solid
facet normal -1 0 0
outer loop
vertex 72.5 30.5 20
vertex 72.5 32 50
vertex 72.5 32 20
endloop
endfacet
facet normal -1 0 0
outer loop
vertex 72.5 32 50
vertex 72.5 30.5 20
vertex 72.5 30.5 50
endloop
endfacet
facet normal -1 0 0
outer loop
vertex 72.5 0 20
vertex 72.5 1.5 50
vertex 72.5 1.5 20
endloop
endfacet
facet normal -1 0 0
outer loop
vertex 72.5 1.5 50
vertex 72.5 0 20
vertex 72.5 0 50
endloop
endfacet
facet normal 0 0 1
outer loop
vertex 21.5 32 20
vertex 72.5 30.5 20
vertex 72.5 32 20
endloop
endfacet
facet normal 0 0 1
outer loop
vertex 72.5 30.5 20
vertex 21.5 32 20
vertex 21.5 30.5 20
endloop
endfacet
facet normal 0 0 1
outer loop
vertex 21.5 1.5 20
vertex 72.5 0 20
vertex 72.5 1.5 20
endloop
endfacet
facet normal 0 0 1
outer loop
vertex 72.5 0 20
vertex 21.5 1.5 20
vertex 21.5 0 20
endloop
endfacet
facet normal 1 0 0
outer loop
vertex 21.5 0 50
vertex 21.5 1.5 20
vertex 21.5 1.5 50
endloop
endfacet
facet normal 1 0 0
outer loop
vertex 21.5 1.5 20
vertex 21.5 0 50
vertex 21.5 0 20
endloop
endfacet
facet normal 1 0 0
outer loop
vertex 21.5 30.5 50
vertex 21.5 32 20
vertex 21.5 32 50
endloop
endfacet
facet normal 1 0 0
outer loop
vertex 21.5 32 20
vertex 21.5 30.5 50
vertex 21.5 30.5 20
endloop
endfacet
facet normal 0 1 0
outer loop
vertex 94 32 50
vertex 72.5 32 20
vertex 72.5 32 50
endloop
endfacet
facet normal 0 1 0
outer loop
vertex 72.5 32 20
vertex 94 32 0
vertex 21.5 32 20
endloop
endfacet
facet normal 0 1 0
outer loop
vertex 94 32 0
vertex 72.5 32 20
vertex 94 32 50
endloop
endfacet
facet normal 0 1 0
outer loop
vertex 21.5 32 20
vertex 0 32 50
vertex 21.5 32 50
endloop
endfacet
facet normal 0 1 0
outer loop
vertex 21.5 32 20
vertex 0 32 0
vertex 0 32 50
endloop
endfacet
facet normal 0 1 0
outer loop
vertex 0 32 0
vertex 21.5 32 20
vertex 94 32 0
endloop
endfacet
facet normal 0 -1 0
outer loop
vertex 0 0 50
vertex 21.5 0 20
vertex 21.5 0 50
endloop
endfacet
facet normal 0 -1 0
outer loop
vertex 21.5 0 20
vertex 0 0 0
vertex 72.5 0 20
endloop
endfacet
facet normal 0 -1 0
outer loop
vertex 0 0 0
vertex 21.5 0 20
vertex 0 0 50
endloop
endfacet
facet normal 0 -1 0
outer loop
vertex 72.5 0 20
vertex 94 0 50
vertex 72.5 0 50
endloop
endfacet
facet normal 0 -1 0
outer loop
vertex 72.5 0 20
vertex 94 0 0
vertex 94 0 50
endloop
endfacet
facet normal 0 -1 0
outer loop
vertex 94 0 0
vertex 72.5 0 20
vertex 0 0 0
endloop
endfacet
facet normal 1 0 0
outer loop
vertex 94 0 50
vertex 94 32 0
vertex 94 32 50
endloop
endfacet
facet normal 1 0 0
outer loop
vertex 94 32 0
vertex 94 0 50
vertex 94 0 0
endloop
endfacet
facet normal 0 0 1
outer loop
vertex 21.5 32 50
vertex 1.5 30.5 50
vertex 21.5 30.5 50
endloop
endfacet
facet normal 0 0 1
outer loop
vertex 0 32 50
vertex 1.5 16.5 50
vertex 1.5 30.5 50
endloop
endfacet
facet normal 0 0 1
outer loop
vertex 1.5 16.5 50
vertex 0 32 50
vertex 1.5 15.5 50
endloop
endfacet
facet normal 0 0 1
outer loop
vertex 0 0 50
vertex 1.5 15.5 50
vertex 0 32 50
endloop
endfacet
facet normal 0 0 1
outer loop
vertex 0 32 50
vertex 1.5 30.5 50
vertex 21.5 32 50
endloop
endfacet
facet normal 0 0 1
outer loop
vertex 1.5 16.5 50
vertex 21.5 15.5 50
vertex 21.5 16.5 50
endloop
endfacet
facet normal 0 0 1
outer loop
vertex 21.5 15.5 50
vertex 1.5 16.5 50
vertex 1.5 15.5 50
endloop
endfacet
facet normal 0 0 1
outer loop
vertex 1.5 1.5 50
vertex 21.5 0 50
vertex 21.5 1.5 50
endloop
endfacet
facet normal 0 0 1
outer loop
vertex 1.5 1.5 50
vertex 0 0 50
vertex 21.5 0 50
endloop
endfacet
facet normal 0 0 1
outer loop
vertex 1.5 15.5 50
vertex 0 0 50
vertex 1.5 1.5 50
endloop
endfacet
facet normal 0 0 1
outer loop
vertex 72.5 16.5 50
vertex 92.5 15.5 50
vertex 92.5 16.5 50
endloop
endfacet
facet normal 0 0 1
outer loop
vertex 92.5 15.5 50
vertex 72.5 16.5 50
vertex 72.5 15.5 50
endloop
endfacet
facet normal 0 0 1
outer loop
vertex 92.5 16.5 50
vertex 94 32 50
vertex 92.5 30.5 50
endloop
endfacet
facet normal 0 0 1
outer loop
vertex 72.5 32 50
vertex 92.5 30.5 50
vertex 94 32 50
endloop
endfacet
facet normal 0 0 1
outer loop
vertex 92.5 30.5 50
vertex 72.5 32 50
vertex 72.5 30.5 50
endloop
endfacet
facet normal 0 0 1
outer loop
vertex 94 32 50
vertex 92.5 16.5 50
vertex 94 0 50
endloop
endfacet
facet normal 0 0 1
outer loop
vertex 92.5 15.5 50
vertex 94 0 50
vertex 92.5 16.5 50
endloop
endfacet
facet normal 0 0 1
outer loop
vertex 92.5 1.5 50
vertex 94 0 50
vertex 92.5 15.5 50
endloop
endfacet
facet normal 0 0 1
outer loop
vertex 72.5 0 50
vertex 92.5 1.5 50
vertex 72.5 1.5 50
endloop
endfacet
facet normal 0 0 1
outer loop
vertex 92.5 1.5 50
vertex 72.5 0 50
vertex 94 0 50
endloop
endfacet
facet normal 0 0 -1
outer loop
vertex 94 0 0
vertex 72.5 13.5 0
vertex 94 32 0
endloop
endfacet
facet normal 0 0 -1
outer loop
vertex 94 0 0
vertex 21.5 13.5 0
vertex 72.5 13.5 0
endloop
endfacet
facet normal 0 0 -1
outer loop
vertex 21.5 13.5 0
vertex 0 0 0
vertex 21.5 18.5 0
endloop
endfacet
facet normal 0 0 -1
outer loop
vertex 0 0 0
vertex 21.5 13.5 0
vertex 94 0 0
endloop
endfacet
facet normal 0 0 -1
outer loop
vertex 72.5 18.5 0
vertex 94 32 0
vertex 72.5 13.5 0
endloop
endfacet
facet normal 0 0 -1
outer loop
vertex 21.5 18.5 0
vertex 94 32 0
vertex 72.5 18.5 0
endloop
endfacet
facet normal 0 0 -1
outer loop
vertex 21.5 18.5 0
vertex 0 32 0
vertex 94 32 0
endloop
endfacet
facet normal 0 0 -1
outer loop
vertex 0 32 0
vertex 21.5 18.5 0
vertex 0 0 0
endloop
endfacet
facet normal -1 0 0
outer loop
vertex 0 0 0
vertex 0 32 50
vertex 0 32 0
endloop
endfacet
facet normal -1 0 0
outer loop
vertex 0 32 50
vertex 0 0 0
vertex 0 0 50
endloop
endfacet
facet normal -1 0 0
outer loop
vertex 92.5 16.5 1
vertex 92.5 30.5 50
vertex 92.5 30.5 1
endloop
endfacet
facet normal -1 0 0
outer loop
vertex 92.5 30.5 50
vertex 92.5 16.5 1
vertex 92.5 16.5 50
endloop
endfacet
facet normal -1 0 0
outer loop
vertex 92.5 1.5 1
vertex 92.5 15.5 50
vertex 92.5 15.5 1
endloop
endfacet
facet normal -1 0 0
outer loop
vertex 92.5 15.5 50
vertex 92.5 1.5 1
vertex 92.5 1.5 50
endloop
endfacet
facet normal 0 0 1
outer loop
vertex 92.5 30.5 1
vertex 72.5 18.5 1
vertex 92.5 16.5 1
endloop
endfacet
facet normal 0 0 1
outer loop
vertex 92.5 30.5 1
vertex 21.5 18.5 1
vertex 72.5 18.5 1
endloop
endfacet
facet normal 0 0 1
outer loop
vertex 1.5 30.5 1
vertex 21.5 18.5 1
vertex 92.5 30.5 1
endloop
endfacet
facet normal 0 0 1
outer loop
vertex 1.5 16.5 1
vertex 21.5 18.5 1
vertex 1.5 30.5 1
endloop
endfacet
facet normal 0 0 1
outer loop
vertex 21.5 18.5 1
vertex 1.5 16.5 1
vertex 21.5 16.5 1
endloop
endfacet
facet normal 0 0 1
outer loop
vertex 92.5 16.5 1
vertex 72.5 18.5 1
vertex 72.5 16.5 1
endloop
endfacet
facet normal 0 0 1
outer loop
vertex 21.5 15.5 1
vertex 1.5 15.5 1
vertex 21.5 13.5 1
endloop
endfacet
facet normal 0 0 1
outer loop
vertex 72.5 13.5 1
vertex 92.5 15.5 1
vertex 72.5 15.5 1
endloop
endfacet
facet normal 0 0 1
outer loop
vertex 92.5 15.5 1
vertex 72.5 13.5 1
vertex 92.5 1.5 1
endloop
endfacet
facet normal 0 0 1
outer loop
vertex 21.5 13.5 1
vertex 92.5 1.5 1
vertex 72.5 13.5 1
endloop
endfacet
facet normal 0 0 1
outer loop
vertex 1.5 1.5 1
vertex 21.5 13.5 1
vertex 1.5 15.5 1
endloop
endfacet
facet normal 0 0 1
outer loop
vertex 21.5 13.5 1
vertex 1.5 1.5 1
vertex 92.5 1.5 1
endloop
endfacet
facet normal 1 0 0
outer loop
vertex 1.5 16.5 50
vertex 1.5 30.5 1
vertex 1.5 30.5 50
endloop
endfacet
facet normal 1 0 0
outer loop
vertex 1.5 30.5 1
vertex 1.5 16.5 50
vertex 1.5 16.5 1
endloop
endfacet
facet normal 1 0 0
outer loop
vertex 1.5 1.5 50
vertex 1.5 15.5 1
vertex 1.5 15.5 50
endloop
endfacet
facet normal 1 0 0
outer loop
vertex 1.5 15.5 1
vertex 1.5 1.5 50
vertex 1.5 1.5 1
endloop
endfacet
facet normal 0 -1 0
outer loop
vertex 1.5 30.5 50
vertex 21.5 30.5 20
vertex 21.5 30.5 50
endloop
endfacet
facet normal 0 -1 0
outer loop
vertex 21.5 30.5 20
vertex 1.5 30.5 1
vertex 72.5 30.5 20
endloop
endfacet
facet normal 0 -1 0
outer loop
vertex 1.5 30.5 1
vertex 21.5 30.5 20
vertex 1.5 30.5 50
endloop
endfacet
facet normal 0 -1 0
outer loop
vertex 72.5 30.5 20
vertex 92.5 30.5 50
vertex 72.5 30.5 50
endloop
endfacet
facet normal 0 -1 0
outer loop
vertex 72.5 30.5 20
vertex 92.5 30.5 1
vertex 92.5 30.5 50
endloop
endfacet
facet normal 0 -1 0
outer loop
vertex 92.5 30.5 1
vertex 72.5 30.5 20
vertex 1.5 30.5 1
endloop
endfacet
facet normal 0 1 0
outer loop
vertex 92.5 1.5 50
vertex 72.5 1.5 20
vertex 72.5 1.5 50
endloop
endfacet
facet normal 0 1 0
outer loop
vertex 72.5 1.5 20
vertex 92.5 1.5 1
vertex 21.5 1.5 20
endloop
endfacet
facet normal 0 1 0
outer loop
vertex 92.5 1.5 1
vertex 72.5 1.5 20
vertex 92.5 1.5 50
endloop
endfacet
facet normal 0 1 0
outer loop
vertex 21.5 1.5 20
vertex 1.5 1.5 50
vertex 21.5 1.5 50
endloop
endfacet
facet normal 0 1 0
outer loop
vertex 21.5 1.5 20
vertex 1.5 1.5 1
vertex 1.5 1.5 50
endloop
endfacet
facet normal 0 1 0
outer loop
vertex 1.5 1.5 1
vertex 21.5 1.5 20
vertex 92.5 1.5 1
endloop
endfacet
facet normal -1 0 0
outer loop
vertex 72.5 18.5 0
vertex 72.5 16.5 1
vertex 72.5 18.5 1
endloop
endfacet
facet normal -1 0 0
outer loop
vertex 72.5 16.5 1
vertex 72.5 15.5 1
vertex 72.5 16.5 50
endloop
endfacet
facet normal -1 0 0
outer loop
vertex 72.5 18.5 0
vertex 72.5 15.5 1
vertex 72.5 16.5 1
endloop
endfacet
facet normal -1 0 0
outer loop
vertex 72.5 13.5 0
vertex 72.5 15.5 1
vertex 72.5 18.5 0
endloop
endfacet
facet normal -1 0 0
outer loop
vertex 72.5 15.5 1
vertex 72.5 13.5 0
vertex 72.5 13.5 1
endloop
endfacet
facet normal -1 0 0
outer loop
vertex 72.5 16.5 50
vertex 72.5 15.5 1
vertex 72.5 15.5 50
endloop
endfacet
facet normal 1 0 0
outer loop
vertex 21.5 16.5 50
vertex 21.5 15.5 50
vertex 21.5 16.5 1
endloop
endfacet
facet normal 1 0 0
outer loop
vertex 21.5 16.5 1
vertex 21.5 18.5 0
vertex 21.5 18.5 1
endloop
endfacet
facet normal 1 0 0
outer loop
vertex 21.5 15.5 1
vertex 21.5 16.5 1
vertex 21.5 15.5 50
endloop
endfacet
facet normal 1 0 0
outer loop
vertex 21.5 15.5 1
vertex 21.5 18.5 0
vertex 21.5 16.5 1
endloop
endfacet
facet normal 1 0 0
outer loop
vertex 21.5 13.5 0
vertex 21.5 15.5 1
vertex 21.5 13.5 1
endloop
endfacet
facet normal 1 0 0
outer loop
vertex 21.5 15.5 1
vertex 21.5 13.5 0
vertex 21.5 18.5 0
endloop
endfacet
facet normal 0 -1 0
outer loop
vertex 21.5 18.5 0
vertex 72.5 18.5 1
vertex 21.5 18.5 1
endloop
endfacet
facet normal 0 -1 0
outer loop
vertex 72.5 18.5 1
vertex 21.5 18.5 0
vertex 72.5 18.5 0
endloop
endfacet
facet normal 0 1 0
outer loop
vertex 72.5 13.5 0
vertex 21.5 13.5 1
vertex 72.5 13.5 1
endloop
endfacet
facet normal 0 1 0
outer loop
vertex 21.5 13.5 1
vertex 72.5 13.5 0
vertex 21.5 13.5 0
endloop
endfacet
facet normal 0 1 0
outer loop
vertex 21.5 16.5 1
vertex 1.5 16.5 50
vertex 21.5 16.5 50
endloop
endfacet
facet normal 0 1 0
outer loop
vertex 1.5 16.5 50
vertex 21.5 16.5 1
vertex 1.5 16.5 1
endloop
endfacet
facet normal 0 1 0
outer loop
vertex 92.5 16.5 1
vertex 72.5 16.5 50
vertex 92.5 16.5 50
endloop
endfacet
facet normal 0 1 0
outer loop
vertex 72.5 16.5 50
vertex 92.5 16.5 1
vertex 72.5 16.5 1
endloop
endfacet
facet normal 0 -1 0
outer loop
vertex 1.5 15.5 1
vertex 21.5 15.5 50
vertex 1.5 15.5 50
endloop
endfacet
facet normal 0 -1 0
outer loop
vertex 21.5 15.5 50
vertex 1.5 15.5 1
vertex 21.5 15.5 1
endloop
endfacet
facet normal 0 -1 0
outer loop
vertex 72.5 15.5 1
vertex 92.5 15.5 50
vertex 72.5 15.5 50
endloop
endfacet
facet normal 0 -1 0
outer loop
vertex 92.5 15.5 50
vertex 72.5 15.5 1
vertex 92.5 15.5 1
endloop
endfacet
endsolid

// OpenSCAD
// file: ../../../standard-organizers/container.scad
function defaultBottomThickness() = 1;
function defaultBottomClearance() = 16;
function defaultMinWallThickness() = 1;
function defaultWallClearance() = 16;
function defaultSideMultiple() = 2;

function getOuterWidth(innerWidth, minWallThickness, sideMultiple) = ceil((innerWidth + 2*minWallThickness)/sideMultiple)*sideMultiple;
function getOuterDepth(innerDepth, minWallThickness, sideMultiple) = ceil((innerDepth + 2*minWallThickness)/sideMultiple)*sideMultiple;
function getSideWallThickness(innerWidth, minWallThickness, sideMultiple) = (getOuterWidth(innerWidth, minWallThickness, sideMultiple) - innerWidth)/2;
function getFrontWallThickness(innerDepth, minWallThickness, sideMultiple) = (getOuterDepth(innerDepth, minWallThickness, sideMultiple) - innerDepth)/2;

function getFrontHole(innerWidth, innerDepth, outerHeight, bottomClearance, minWallThickness, frontWallClearance, sideMultiple) = [
    [
        getSideWallThickness(innerWidth, minWallThickness, sideMultiple) + frontWallClearance,
        0,
        bottomClearance
    ],
    [
        max(5, innerWidth - 2*frontWallClearance),
        getOuterDepth(innerDepth, minWallThickness, sideMultiple),
        outerHeight
    ]
];

function getSideHole(innerWidth, innerDepth, outerHeight, bottomClearance, minWallThickness, sideWallClearance, sideMultiple) = [
    [
        0,
        getFrontWallThickness(innerDepth, minWallThickness, sideMultiple) + sideWallClearance,
        bottomClearance
    ],
    [
        getOuterWidth(innerWidth, minWallThickness, sideMultiple),
        max(5, innerDepth - 2*sideWallClearance),
        outerHeight
    ]
];

module container (
    innerWidth,
    innerDepth,
    outerHeight,
    type = "solid",
    bottomThickness = defaultBottomThickness(),
    bottomClearance = defaultBottomClearance(),
    minWallThickness = defaultMinWallThickness(),
    frontWallClearance = defaultWallClearance(),
    sideWallClearance = defaultWallClearance(),
    sideMultiple = defaultSideMultiple()
) {
    innerHeight = outerHeight - bottomThickness;
    
    outerWidth = getOuterWidth(innerWidth, minWallThickness, sideMultiple);
    outerDepth = getOuterDepth(innerDepth, minWallThickness, sideMultiple);
    sideWallThickness = getSideWallThickness(innerWidth, minWallThickness, sideMultiple);
    frontWallThickness = getFrontWallThickness(innerDepth, minWallThickness, sideMultiple);

    echo("Width", innerWidth, outerWidth, sideWallThickness);
    echo("Depth", innerDepth, outerDepth, frontWallThickness);

    holeWidth = max(5, innerWidth - 2*bottomClearance);
    holeDepth = max(5, innerDepth - 2*bottomClearance);
    holeX = sideWallThickness + innerWidth/2 - holeWidth/2;
    holeY = frontWallThickness + innerDepth/2 - holeDepth/2;
    
    frontHole = getFrontHole(
        innerWidth,
        innerDepth,
        outerHeight,
        bottomClearance,
        minWallThickness,
        frontWallClearance,
        sideMultiple
    );
    frontHolePosition = frontHole[0];
    frontHoleDimesions = frontHole[1];
    
    sideHole = getSideHole(
        innerWidth,
        innerDepth,
        outerHeight,
        bottomClearance,
        minWallThickness,
        sideWallClearance,
        sideMultiple
    );
    sideHolePosition = sideHole[0];
    sideHoleDimensions = sideHole[1];

    difference() {
        // Outer box
        cube([outerWidth, outerDepth, outerHeight]);
        
        // Inner box
        translate([sideWallThickness, frontWallThickness, bottomThickness])
        cube([innerWidth, innerDepth, innerHeight]);
        
        // Bottom hole
        translate([holeX, holeY, 0])
        cube([holeWidth, holeDepth, bottomThickness]);
        
        if(type == "hollow") {
            // Front and back hole
            translate(frontHolePosition)
            cube(frontHoleDimesions);
            
            // Side holes
            translate(sideHolePosition)
            cube(sideHoleDimensions);
        }
    }
}
// main file
use <../../../standard-organizers/container.scad>;

// 4 coaster container dimensions
innerWidth = 91;
innerDepth = 14;

// 8 coaster container dimensions
outerHeight = 50;
separatorDepth = 1;
innerDepthWithSeparator = 2*innerDepth + separatorDepth;

bottomClearance = 20;
minWallThickness = defaultMinWallThickness();
sideMultiple = defaultSideMultiple();
frontWallClearance = bottomClearance;
sideWallThickness = getSideWallThickness(innerWidth, minWallThickness, sideMultiple);

holeBottomClearance = 0;
holeWallClearance = bottomClearance;
separatorHole = getFrontHole(
    innerWidth,
    innerDepthWithSeparator,
    outerHeight,
    holeBottomClearance,
    minWallThickness,
    frontWallClearance,
    sideMultiple
);

outerDepth = getOuterDepth(innerDepthWithSeparator, minWallThickness, sideMultiple);
separatorX = sideWallThickness;
separatorY = outerDepth/2 - separatorDepth/2;

container(
    innerWidth,
    innerDepthWithSeparator,
    outerHeight,
    "hollow",
    defaultBottomThickness(),
    bottomClearance,
    minWallThickness,
    frontWallClearance,
    100,
    sideMultiple
);

difference() {
    // separator
    translate([separatorX, separatorY, 0])
    cube([innerWidth, separatorDepth, outerHeight]);
    
    // separator hole
    translate(separatorHole[0])
    cube(separatorHole[1]);
}
